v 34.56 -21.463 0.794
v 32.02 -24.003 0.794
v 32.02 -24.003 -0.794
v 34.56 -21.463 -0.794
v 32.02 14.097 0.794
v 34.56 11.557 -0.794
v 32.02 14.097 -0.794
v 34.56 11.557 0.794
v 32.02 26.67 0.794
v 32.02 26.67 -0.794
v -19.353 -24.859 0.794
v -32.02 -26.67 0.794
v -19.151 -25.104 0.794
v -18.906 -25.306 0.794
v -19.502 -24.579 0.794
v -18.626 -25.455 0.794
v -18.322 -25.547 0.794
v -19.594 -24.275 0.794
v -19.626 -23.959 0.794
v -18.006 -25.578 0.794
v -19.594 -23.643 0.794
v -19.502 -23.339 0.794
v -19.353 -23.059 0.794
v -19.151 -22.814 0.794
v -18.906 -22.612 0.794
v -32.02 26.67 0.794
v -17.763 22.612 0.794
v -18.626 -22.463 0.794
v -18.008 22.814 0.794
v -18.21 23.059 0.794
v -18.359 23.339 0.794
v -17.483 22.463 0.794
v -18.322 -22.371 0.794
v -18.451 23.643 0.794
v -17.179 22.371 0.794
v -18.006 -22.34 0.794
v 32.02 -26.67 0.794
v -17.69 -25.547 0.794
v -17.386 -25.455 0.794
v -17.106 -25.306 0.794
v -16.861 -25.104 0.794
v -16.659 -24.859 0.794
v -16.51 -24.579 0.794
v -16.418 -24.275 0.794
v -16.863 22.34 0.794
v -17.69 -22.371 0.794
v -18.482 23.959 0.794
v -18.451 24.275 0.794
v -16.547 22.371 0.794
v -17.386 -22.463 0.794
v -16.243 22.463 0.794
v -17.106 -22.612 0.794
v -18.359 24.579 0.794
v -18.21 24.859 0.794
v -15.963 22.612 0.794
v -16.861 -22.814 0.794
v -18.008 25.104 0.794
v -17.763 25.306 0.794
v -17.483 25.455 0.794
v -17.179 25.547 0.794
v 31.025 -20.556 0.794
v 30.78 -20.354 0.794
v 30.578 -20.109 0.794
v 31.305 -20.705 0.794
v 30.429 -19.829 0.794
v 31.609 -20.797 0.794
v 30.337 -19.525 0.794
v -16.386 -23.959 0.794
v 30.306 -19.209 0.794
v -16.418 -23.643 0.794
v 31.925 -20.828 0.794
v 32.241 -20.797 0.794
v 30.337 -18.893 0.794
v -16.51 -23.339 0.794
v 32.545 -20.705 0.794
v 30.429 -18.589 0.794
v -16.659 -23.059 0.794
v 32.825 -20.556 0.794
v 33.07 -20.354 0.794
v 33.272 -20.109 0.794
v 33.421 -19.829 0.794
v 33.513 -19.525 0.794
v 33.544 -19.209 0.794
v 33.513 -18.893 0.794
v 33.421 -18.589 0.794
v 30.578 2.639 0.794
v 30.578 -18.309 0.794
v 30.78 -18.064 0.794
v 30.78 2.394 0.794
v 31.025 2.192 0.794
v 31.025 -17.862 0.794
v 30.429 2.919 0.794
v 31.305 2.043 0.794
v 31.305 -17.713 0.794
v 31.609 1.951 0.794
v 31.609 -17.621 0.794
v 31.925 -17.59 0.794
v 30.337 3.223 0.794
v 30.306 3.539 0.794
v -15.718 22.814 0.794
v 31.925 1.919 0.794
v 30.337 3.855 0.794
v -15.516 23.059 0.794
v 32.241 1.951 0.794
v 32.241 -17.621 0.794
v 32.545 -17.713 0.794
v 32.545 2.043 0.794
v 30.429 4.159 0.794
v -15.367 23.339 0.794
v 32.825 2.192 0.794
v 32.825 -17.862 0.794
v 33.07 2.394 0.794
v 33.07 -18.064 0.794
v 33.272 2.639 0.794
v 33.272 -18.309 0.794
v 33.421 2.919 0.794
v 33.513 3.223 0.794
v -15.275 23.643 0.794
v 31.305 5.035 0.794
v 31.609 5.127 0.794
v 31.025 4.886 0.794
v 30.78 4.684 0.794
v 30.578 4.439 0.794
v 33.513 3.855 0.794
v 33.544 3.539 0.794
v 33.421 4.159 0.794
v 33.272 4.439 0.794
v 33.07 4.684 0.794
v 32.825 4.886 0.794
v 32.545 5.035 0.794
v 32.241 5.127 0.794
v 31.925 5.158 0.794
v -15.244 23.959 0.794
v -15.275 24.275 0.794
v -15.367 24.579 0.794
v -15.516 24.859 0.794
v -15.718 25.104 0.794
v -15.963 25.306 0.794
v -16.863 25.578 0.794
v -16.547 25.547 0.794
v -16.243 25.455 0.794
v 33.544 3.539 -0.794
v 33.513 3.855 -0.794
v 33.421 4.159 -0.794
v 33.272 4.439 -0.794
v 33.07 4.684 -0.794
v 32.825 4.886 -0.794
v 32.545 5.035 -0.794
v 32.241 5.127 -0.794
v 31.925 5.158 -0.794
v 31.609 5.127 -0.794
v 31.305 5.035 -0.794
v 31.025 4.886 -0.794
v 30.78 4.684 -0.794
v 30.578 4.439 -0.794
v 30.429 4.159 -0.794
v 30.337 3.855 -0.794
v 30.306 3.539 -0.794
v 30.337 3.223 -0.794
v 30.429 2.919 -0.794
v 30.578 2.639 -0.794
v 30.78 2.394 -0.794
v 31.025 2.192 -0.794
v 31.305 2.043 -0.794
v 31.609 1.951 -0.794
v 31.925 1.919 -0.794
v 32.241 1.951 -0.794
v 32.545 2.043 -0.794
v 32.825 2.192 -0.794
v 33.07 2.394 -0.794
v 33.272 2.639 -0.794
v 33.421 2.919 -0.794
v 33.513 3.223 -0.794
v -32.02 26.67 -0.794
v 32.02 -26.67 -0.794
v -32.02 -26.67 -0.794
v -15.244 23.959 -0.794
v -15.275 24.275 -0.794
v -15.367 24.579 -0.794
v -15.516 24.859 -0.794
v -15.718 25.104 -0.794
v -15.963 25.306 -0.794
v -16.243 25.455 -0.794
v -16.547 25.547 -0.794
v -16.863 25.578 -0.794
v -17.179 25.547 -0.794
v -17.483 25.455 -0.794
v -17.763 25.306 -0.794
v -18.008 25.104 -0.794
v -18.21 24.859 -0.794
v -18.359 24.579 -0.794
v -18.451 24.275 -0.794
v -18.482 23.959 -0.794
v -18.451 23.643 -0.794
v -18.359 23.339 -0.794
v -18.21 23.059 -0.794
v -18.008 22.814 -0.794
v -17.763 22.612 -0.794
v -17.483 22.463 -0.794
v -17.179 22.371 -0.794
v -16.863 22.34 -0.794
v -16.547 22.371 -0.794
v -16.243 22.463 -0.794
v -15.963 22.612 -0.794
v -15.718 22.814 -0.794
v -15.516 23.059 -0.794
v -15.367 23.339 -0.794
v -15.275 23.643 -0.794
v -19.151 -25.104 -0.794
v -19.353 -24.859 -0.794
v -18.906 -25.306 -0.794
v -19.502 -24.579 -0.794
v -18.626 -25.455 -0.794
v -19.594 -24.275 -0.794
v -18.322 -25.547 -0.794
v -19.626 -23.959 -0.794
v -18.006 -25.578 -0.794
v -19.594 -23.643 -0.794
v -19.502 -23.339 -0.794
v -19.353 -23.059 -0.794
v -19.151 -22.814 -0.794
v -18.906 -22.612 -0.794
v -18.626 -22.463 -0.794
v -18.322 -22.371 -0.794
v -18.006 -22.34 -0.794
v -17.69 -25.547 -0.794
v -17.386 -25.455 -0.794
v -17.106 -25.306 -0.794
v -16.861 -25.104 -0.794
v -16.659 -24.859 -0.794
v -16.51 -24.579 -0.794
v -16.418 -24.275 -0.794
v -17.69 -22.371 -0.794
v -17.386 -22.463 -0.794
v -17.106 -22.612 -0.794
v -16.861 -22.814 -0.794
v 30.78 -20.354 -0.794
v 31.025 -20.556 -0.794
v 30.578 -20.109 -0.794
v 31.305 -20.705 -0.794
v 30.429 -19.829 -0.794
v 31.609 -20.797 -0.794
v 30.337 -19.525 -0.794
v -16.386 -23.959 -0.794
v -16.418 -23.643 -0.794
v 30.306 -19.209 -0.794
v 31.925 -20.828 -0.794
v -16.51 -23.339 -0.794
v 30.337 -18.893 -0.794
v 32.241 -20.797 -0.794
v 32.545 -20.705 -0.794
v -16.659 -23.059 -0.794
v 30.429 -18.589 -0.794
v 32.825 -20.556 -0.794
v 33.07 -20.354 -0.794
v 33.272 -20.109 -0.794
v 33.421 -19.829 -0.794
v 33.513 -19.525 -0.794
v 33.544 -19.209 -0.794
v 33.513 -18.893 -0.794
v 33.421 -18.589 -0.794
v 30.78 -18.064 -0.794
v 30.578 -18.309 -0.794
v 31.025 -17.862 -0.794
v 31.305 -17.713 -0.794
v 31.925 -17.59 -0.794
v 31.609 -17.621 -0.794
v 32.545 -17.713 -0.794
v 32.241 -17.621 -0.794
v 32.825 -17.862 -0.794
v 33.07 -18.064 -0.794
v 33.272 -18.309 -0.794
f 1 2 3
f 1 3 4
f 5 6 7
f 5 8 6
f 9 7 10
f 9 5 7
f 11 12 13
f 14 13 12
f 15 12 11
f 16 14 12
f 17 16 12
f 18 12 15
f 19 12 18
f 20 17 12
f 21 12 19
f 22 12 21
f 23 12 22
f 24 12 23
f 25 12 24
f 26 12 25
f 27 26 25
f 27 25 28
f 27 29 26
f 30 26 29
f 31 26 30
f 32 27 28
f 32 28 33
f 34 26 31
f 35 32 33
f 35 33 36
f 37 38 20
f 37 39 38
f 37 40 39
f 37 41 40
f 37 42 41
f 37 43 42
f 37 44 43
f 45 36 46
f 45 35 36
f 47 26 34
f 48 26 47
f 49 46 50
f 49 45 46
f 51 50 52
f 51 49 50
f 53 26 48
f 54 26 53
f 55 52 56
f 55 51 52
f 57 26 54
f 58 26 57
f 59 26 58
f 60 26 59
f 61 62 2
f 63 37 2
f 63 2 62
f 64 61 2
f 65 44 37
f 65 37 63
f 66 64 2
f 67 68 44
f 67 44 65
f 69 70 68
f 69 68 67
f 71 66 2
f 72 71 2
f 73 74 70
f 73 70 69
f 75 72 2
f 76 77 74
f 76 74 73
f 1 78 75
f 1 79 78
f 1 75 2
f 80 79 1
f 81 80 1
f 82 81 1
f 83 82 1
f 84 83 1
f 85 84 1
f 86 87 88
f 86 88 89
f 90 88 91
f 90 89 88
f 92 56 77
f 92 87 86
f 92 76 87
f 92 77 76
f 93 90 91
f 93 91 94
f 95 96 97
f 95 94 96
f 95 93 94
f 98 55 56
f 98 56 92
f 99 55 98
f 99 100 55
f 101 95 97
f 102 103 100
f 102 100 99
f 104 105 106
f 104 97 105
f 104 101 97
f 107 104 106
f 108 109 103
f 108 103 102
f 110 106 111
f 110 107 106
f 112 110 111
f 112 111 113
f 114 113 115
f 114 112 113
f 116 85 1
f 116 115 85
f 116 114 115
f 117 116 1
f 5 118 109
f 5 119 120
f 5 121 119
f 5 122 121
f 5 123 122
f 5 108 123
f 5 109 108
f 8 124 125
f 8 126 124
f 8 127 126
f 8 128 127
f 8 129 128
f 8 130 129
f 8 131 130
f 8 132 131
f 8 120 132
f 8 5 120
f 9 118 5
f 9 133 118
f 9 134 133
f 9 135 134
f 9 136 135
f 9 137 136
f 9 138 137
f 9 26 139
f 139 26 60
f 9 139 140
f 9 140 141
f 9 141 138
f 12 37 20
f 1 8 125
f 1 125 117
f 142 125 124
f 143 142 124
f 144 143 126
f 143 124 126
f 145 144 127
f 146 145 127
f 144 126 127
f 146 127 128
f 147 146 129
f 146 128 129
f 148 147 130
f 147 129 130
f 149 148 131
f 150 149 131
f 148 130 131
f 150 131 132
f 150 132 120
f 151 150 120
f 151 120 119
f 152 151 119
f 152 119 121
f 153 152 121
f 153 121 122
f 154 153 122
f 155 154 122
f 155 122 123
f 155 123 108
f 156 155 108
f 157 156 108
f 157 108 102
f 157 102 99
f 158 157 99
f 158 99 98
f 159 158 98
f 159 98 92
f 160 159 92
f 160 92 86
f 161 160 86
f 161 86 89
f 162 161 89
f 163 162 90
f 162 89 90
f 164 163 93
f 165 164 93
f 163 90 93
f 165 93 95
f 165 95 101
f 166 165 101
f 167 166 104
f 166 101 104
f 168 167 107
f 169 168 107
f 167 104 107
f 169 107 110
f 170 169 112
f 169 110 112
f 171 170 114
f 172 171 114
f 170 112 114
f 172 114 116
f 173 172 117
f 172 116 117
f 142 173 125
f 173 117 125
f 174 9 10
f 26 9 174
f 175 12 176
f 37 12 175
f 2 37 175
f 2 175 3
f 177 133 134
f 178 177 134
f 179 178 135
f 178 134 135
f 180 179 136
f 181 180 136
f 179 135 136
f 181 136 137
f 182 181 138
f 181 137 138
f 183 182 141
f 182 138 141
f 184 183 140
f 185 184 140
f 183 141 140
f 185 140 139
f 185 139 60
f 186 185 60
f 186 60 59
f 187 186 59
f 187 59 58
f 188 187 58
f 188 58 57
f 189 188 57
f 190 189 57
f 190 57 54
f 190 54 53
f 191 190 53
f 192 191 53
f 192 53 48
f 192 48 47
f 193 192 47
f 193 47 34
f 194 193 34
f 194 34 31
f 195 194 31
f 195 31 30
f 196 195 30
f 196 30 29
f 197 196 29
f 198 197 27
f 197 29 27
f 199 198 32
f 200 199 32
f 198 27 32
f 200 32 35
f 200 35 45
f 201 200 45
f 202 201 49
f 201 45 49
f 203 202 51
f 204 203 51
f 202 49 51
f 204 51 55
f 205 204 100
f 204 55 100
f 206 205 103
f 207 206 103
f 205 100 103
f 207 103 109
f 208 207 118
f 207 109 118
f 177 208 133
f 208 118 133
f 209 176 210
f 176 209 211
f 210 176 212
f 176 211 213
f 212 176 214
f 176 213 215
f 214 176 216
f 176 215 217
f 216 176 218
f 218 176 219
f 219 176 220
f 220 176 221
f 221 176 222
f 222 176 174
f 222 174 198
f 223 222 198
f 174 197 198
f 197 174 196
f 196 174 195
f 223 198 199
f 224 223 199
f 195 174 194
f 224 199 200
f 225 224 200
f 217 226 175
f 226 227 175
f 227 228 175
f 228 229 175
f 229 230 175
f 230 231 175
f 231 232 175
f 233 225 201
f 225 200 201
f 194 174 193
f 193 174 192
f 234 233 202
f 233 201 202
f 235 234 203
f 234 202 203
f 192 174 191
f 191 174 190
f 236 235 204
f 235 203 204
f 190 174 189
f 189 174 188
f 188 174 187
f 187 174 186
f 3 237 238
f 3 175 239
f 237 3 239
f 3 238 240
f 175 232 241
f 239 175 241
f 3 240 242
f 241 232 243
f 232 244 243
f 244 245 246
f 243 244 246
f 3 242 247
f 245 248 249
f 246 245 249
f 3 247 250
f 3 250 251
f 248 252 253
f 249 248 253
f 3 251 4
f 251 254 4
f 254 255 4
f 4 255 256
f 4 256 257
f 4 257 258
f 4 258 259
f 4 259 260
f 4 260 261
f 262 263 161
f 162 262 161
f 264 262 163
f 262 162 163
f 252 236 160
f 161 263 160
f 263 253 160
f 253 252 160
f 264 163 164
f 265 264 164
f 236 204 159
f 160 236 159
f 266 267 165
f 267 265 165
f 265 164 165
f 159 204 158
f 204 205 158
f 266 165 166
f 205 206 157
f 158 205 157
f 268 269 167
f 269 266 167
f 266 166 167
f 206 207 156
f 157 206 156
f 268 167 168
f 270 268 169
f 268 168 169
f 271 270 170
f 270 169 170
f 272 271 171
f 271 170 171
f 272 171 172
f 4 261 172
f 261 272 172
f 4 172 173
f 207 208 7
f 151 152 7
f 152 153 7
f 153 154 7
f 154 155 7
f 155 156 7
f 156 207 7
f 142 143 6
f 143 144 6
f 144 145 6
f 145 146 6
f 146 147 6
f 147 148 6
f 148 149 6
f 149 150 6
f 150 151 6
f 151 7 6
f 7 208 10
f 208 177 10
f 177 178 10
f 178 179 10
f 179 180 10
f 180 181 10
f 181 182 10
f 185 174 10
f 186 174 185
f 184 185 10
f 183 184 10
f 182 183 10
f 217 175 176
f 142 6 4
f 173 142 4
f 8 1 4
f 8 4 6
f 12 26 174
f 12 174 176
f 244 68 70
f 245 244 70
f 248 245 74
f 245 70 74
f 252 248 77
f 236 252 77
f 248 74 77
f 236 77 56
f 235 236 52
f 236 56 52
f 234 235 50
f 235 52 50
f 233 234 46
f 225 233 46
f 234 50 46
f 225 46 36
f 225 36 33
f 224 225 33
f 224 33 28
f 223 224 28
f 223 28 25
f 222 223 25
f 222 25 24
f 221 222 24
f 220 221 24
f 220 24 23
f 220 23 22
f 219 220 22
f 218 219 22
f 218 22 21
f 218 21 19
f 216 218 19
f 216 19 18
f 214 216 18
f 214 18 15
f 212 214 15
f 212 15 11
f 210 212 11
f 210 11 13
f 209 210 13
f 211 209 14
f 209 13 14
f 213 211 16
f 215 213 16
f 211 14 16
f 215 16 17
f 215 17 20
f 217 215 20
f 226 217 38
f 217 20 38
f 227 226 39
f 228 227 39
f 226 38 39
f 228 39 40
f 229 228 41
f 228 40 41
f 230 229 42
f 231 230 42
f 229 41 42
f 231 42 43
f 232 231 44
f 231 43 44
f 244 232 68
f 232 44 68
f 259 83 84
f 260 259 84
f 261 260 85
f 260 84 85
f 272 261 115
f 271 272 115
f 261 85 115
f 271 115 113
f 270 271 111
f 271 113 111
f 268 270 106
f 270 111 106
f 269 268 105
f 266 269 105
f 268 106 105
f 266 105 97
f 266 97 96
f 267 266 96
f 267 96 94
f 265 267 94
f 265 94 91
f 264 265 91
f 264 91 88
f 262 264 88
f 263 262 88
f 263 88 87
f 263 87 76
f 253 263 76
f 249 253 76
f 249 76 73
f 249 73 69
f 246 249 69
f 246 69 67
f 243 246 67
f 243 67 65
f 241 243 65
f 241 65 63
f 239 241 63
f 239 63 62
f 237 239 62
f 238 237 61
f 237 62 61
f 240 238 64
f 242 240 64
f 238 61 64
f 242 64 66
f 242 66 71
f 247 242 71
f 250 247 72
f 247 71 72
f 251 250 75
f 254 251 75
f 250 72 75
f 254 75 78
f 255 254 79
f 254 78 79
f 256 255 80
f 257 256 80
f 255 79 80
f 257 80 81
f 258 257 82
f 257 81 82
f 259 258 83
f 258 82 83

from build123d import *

# Parameters (mm, degrees)
F1_DEPTH = 0.794
F2_R     = 1.6195
F3_DEPTH = 25


with BuildPart() as f1:
    # F0 (on Top) → F1 (new body, symmetric)
    with BuildSketch(Plane.XY):
        Polygon((32.02, 26.67), (-32.02, 26.67), (-32.02, 0), (-32.02, -26.67), (32.02, -26.67), (32.02, -24.003), (34.56, -21.463), (34.56, 11.557), (32.02, 14.097), align=None)
    extrude(amount=F1_DEPTH, both=True)

    # F2 (on face) → F3 (cut)
    with BuildSketch(Plane.XY.offset(0.794)):
        with Locations((-16.863, 23.959)):
            Circle(F2_R)
        with Locations((-18.006, -23.959)):
            Circle(F2_R)
        with Locations((31.925, 3.538941)):
            Circle(F2_R)
        with Locations((31.925, -19.209)):
            Circle(F2_R)
    extrude(amount=-F3_DEPTH, mode=Mode.SUBTRACT)


solid = f1.part
